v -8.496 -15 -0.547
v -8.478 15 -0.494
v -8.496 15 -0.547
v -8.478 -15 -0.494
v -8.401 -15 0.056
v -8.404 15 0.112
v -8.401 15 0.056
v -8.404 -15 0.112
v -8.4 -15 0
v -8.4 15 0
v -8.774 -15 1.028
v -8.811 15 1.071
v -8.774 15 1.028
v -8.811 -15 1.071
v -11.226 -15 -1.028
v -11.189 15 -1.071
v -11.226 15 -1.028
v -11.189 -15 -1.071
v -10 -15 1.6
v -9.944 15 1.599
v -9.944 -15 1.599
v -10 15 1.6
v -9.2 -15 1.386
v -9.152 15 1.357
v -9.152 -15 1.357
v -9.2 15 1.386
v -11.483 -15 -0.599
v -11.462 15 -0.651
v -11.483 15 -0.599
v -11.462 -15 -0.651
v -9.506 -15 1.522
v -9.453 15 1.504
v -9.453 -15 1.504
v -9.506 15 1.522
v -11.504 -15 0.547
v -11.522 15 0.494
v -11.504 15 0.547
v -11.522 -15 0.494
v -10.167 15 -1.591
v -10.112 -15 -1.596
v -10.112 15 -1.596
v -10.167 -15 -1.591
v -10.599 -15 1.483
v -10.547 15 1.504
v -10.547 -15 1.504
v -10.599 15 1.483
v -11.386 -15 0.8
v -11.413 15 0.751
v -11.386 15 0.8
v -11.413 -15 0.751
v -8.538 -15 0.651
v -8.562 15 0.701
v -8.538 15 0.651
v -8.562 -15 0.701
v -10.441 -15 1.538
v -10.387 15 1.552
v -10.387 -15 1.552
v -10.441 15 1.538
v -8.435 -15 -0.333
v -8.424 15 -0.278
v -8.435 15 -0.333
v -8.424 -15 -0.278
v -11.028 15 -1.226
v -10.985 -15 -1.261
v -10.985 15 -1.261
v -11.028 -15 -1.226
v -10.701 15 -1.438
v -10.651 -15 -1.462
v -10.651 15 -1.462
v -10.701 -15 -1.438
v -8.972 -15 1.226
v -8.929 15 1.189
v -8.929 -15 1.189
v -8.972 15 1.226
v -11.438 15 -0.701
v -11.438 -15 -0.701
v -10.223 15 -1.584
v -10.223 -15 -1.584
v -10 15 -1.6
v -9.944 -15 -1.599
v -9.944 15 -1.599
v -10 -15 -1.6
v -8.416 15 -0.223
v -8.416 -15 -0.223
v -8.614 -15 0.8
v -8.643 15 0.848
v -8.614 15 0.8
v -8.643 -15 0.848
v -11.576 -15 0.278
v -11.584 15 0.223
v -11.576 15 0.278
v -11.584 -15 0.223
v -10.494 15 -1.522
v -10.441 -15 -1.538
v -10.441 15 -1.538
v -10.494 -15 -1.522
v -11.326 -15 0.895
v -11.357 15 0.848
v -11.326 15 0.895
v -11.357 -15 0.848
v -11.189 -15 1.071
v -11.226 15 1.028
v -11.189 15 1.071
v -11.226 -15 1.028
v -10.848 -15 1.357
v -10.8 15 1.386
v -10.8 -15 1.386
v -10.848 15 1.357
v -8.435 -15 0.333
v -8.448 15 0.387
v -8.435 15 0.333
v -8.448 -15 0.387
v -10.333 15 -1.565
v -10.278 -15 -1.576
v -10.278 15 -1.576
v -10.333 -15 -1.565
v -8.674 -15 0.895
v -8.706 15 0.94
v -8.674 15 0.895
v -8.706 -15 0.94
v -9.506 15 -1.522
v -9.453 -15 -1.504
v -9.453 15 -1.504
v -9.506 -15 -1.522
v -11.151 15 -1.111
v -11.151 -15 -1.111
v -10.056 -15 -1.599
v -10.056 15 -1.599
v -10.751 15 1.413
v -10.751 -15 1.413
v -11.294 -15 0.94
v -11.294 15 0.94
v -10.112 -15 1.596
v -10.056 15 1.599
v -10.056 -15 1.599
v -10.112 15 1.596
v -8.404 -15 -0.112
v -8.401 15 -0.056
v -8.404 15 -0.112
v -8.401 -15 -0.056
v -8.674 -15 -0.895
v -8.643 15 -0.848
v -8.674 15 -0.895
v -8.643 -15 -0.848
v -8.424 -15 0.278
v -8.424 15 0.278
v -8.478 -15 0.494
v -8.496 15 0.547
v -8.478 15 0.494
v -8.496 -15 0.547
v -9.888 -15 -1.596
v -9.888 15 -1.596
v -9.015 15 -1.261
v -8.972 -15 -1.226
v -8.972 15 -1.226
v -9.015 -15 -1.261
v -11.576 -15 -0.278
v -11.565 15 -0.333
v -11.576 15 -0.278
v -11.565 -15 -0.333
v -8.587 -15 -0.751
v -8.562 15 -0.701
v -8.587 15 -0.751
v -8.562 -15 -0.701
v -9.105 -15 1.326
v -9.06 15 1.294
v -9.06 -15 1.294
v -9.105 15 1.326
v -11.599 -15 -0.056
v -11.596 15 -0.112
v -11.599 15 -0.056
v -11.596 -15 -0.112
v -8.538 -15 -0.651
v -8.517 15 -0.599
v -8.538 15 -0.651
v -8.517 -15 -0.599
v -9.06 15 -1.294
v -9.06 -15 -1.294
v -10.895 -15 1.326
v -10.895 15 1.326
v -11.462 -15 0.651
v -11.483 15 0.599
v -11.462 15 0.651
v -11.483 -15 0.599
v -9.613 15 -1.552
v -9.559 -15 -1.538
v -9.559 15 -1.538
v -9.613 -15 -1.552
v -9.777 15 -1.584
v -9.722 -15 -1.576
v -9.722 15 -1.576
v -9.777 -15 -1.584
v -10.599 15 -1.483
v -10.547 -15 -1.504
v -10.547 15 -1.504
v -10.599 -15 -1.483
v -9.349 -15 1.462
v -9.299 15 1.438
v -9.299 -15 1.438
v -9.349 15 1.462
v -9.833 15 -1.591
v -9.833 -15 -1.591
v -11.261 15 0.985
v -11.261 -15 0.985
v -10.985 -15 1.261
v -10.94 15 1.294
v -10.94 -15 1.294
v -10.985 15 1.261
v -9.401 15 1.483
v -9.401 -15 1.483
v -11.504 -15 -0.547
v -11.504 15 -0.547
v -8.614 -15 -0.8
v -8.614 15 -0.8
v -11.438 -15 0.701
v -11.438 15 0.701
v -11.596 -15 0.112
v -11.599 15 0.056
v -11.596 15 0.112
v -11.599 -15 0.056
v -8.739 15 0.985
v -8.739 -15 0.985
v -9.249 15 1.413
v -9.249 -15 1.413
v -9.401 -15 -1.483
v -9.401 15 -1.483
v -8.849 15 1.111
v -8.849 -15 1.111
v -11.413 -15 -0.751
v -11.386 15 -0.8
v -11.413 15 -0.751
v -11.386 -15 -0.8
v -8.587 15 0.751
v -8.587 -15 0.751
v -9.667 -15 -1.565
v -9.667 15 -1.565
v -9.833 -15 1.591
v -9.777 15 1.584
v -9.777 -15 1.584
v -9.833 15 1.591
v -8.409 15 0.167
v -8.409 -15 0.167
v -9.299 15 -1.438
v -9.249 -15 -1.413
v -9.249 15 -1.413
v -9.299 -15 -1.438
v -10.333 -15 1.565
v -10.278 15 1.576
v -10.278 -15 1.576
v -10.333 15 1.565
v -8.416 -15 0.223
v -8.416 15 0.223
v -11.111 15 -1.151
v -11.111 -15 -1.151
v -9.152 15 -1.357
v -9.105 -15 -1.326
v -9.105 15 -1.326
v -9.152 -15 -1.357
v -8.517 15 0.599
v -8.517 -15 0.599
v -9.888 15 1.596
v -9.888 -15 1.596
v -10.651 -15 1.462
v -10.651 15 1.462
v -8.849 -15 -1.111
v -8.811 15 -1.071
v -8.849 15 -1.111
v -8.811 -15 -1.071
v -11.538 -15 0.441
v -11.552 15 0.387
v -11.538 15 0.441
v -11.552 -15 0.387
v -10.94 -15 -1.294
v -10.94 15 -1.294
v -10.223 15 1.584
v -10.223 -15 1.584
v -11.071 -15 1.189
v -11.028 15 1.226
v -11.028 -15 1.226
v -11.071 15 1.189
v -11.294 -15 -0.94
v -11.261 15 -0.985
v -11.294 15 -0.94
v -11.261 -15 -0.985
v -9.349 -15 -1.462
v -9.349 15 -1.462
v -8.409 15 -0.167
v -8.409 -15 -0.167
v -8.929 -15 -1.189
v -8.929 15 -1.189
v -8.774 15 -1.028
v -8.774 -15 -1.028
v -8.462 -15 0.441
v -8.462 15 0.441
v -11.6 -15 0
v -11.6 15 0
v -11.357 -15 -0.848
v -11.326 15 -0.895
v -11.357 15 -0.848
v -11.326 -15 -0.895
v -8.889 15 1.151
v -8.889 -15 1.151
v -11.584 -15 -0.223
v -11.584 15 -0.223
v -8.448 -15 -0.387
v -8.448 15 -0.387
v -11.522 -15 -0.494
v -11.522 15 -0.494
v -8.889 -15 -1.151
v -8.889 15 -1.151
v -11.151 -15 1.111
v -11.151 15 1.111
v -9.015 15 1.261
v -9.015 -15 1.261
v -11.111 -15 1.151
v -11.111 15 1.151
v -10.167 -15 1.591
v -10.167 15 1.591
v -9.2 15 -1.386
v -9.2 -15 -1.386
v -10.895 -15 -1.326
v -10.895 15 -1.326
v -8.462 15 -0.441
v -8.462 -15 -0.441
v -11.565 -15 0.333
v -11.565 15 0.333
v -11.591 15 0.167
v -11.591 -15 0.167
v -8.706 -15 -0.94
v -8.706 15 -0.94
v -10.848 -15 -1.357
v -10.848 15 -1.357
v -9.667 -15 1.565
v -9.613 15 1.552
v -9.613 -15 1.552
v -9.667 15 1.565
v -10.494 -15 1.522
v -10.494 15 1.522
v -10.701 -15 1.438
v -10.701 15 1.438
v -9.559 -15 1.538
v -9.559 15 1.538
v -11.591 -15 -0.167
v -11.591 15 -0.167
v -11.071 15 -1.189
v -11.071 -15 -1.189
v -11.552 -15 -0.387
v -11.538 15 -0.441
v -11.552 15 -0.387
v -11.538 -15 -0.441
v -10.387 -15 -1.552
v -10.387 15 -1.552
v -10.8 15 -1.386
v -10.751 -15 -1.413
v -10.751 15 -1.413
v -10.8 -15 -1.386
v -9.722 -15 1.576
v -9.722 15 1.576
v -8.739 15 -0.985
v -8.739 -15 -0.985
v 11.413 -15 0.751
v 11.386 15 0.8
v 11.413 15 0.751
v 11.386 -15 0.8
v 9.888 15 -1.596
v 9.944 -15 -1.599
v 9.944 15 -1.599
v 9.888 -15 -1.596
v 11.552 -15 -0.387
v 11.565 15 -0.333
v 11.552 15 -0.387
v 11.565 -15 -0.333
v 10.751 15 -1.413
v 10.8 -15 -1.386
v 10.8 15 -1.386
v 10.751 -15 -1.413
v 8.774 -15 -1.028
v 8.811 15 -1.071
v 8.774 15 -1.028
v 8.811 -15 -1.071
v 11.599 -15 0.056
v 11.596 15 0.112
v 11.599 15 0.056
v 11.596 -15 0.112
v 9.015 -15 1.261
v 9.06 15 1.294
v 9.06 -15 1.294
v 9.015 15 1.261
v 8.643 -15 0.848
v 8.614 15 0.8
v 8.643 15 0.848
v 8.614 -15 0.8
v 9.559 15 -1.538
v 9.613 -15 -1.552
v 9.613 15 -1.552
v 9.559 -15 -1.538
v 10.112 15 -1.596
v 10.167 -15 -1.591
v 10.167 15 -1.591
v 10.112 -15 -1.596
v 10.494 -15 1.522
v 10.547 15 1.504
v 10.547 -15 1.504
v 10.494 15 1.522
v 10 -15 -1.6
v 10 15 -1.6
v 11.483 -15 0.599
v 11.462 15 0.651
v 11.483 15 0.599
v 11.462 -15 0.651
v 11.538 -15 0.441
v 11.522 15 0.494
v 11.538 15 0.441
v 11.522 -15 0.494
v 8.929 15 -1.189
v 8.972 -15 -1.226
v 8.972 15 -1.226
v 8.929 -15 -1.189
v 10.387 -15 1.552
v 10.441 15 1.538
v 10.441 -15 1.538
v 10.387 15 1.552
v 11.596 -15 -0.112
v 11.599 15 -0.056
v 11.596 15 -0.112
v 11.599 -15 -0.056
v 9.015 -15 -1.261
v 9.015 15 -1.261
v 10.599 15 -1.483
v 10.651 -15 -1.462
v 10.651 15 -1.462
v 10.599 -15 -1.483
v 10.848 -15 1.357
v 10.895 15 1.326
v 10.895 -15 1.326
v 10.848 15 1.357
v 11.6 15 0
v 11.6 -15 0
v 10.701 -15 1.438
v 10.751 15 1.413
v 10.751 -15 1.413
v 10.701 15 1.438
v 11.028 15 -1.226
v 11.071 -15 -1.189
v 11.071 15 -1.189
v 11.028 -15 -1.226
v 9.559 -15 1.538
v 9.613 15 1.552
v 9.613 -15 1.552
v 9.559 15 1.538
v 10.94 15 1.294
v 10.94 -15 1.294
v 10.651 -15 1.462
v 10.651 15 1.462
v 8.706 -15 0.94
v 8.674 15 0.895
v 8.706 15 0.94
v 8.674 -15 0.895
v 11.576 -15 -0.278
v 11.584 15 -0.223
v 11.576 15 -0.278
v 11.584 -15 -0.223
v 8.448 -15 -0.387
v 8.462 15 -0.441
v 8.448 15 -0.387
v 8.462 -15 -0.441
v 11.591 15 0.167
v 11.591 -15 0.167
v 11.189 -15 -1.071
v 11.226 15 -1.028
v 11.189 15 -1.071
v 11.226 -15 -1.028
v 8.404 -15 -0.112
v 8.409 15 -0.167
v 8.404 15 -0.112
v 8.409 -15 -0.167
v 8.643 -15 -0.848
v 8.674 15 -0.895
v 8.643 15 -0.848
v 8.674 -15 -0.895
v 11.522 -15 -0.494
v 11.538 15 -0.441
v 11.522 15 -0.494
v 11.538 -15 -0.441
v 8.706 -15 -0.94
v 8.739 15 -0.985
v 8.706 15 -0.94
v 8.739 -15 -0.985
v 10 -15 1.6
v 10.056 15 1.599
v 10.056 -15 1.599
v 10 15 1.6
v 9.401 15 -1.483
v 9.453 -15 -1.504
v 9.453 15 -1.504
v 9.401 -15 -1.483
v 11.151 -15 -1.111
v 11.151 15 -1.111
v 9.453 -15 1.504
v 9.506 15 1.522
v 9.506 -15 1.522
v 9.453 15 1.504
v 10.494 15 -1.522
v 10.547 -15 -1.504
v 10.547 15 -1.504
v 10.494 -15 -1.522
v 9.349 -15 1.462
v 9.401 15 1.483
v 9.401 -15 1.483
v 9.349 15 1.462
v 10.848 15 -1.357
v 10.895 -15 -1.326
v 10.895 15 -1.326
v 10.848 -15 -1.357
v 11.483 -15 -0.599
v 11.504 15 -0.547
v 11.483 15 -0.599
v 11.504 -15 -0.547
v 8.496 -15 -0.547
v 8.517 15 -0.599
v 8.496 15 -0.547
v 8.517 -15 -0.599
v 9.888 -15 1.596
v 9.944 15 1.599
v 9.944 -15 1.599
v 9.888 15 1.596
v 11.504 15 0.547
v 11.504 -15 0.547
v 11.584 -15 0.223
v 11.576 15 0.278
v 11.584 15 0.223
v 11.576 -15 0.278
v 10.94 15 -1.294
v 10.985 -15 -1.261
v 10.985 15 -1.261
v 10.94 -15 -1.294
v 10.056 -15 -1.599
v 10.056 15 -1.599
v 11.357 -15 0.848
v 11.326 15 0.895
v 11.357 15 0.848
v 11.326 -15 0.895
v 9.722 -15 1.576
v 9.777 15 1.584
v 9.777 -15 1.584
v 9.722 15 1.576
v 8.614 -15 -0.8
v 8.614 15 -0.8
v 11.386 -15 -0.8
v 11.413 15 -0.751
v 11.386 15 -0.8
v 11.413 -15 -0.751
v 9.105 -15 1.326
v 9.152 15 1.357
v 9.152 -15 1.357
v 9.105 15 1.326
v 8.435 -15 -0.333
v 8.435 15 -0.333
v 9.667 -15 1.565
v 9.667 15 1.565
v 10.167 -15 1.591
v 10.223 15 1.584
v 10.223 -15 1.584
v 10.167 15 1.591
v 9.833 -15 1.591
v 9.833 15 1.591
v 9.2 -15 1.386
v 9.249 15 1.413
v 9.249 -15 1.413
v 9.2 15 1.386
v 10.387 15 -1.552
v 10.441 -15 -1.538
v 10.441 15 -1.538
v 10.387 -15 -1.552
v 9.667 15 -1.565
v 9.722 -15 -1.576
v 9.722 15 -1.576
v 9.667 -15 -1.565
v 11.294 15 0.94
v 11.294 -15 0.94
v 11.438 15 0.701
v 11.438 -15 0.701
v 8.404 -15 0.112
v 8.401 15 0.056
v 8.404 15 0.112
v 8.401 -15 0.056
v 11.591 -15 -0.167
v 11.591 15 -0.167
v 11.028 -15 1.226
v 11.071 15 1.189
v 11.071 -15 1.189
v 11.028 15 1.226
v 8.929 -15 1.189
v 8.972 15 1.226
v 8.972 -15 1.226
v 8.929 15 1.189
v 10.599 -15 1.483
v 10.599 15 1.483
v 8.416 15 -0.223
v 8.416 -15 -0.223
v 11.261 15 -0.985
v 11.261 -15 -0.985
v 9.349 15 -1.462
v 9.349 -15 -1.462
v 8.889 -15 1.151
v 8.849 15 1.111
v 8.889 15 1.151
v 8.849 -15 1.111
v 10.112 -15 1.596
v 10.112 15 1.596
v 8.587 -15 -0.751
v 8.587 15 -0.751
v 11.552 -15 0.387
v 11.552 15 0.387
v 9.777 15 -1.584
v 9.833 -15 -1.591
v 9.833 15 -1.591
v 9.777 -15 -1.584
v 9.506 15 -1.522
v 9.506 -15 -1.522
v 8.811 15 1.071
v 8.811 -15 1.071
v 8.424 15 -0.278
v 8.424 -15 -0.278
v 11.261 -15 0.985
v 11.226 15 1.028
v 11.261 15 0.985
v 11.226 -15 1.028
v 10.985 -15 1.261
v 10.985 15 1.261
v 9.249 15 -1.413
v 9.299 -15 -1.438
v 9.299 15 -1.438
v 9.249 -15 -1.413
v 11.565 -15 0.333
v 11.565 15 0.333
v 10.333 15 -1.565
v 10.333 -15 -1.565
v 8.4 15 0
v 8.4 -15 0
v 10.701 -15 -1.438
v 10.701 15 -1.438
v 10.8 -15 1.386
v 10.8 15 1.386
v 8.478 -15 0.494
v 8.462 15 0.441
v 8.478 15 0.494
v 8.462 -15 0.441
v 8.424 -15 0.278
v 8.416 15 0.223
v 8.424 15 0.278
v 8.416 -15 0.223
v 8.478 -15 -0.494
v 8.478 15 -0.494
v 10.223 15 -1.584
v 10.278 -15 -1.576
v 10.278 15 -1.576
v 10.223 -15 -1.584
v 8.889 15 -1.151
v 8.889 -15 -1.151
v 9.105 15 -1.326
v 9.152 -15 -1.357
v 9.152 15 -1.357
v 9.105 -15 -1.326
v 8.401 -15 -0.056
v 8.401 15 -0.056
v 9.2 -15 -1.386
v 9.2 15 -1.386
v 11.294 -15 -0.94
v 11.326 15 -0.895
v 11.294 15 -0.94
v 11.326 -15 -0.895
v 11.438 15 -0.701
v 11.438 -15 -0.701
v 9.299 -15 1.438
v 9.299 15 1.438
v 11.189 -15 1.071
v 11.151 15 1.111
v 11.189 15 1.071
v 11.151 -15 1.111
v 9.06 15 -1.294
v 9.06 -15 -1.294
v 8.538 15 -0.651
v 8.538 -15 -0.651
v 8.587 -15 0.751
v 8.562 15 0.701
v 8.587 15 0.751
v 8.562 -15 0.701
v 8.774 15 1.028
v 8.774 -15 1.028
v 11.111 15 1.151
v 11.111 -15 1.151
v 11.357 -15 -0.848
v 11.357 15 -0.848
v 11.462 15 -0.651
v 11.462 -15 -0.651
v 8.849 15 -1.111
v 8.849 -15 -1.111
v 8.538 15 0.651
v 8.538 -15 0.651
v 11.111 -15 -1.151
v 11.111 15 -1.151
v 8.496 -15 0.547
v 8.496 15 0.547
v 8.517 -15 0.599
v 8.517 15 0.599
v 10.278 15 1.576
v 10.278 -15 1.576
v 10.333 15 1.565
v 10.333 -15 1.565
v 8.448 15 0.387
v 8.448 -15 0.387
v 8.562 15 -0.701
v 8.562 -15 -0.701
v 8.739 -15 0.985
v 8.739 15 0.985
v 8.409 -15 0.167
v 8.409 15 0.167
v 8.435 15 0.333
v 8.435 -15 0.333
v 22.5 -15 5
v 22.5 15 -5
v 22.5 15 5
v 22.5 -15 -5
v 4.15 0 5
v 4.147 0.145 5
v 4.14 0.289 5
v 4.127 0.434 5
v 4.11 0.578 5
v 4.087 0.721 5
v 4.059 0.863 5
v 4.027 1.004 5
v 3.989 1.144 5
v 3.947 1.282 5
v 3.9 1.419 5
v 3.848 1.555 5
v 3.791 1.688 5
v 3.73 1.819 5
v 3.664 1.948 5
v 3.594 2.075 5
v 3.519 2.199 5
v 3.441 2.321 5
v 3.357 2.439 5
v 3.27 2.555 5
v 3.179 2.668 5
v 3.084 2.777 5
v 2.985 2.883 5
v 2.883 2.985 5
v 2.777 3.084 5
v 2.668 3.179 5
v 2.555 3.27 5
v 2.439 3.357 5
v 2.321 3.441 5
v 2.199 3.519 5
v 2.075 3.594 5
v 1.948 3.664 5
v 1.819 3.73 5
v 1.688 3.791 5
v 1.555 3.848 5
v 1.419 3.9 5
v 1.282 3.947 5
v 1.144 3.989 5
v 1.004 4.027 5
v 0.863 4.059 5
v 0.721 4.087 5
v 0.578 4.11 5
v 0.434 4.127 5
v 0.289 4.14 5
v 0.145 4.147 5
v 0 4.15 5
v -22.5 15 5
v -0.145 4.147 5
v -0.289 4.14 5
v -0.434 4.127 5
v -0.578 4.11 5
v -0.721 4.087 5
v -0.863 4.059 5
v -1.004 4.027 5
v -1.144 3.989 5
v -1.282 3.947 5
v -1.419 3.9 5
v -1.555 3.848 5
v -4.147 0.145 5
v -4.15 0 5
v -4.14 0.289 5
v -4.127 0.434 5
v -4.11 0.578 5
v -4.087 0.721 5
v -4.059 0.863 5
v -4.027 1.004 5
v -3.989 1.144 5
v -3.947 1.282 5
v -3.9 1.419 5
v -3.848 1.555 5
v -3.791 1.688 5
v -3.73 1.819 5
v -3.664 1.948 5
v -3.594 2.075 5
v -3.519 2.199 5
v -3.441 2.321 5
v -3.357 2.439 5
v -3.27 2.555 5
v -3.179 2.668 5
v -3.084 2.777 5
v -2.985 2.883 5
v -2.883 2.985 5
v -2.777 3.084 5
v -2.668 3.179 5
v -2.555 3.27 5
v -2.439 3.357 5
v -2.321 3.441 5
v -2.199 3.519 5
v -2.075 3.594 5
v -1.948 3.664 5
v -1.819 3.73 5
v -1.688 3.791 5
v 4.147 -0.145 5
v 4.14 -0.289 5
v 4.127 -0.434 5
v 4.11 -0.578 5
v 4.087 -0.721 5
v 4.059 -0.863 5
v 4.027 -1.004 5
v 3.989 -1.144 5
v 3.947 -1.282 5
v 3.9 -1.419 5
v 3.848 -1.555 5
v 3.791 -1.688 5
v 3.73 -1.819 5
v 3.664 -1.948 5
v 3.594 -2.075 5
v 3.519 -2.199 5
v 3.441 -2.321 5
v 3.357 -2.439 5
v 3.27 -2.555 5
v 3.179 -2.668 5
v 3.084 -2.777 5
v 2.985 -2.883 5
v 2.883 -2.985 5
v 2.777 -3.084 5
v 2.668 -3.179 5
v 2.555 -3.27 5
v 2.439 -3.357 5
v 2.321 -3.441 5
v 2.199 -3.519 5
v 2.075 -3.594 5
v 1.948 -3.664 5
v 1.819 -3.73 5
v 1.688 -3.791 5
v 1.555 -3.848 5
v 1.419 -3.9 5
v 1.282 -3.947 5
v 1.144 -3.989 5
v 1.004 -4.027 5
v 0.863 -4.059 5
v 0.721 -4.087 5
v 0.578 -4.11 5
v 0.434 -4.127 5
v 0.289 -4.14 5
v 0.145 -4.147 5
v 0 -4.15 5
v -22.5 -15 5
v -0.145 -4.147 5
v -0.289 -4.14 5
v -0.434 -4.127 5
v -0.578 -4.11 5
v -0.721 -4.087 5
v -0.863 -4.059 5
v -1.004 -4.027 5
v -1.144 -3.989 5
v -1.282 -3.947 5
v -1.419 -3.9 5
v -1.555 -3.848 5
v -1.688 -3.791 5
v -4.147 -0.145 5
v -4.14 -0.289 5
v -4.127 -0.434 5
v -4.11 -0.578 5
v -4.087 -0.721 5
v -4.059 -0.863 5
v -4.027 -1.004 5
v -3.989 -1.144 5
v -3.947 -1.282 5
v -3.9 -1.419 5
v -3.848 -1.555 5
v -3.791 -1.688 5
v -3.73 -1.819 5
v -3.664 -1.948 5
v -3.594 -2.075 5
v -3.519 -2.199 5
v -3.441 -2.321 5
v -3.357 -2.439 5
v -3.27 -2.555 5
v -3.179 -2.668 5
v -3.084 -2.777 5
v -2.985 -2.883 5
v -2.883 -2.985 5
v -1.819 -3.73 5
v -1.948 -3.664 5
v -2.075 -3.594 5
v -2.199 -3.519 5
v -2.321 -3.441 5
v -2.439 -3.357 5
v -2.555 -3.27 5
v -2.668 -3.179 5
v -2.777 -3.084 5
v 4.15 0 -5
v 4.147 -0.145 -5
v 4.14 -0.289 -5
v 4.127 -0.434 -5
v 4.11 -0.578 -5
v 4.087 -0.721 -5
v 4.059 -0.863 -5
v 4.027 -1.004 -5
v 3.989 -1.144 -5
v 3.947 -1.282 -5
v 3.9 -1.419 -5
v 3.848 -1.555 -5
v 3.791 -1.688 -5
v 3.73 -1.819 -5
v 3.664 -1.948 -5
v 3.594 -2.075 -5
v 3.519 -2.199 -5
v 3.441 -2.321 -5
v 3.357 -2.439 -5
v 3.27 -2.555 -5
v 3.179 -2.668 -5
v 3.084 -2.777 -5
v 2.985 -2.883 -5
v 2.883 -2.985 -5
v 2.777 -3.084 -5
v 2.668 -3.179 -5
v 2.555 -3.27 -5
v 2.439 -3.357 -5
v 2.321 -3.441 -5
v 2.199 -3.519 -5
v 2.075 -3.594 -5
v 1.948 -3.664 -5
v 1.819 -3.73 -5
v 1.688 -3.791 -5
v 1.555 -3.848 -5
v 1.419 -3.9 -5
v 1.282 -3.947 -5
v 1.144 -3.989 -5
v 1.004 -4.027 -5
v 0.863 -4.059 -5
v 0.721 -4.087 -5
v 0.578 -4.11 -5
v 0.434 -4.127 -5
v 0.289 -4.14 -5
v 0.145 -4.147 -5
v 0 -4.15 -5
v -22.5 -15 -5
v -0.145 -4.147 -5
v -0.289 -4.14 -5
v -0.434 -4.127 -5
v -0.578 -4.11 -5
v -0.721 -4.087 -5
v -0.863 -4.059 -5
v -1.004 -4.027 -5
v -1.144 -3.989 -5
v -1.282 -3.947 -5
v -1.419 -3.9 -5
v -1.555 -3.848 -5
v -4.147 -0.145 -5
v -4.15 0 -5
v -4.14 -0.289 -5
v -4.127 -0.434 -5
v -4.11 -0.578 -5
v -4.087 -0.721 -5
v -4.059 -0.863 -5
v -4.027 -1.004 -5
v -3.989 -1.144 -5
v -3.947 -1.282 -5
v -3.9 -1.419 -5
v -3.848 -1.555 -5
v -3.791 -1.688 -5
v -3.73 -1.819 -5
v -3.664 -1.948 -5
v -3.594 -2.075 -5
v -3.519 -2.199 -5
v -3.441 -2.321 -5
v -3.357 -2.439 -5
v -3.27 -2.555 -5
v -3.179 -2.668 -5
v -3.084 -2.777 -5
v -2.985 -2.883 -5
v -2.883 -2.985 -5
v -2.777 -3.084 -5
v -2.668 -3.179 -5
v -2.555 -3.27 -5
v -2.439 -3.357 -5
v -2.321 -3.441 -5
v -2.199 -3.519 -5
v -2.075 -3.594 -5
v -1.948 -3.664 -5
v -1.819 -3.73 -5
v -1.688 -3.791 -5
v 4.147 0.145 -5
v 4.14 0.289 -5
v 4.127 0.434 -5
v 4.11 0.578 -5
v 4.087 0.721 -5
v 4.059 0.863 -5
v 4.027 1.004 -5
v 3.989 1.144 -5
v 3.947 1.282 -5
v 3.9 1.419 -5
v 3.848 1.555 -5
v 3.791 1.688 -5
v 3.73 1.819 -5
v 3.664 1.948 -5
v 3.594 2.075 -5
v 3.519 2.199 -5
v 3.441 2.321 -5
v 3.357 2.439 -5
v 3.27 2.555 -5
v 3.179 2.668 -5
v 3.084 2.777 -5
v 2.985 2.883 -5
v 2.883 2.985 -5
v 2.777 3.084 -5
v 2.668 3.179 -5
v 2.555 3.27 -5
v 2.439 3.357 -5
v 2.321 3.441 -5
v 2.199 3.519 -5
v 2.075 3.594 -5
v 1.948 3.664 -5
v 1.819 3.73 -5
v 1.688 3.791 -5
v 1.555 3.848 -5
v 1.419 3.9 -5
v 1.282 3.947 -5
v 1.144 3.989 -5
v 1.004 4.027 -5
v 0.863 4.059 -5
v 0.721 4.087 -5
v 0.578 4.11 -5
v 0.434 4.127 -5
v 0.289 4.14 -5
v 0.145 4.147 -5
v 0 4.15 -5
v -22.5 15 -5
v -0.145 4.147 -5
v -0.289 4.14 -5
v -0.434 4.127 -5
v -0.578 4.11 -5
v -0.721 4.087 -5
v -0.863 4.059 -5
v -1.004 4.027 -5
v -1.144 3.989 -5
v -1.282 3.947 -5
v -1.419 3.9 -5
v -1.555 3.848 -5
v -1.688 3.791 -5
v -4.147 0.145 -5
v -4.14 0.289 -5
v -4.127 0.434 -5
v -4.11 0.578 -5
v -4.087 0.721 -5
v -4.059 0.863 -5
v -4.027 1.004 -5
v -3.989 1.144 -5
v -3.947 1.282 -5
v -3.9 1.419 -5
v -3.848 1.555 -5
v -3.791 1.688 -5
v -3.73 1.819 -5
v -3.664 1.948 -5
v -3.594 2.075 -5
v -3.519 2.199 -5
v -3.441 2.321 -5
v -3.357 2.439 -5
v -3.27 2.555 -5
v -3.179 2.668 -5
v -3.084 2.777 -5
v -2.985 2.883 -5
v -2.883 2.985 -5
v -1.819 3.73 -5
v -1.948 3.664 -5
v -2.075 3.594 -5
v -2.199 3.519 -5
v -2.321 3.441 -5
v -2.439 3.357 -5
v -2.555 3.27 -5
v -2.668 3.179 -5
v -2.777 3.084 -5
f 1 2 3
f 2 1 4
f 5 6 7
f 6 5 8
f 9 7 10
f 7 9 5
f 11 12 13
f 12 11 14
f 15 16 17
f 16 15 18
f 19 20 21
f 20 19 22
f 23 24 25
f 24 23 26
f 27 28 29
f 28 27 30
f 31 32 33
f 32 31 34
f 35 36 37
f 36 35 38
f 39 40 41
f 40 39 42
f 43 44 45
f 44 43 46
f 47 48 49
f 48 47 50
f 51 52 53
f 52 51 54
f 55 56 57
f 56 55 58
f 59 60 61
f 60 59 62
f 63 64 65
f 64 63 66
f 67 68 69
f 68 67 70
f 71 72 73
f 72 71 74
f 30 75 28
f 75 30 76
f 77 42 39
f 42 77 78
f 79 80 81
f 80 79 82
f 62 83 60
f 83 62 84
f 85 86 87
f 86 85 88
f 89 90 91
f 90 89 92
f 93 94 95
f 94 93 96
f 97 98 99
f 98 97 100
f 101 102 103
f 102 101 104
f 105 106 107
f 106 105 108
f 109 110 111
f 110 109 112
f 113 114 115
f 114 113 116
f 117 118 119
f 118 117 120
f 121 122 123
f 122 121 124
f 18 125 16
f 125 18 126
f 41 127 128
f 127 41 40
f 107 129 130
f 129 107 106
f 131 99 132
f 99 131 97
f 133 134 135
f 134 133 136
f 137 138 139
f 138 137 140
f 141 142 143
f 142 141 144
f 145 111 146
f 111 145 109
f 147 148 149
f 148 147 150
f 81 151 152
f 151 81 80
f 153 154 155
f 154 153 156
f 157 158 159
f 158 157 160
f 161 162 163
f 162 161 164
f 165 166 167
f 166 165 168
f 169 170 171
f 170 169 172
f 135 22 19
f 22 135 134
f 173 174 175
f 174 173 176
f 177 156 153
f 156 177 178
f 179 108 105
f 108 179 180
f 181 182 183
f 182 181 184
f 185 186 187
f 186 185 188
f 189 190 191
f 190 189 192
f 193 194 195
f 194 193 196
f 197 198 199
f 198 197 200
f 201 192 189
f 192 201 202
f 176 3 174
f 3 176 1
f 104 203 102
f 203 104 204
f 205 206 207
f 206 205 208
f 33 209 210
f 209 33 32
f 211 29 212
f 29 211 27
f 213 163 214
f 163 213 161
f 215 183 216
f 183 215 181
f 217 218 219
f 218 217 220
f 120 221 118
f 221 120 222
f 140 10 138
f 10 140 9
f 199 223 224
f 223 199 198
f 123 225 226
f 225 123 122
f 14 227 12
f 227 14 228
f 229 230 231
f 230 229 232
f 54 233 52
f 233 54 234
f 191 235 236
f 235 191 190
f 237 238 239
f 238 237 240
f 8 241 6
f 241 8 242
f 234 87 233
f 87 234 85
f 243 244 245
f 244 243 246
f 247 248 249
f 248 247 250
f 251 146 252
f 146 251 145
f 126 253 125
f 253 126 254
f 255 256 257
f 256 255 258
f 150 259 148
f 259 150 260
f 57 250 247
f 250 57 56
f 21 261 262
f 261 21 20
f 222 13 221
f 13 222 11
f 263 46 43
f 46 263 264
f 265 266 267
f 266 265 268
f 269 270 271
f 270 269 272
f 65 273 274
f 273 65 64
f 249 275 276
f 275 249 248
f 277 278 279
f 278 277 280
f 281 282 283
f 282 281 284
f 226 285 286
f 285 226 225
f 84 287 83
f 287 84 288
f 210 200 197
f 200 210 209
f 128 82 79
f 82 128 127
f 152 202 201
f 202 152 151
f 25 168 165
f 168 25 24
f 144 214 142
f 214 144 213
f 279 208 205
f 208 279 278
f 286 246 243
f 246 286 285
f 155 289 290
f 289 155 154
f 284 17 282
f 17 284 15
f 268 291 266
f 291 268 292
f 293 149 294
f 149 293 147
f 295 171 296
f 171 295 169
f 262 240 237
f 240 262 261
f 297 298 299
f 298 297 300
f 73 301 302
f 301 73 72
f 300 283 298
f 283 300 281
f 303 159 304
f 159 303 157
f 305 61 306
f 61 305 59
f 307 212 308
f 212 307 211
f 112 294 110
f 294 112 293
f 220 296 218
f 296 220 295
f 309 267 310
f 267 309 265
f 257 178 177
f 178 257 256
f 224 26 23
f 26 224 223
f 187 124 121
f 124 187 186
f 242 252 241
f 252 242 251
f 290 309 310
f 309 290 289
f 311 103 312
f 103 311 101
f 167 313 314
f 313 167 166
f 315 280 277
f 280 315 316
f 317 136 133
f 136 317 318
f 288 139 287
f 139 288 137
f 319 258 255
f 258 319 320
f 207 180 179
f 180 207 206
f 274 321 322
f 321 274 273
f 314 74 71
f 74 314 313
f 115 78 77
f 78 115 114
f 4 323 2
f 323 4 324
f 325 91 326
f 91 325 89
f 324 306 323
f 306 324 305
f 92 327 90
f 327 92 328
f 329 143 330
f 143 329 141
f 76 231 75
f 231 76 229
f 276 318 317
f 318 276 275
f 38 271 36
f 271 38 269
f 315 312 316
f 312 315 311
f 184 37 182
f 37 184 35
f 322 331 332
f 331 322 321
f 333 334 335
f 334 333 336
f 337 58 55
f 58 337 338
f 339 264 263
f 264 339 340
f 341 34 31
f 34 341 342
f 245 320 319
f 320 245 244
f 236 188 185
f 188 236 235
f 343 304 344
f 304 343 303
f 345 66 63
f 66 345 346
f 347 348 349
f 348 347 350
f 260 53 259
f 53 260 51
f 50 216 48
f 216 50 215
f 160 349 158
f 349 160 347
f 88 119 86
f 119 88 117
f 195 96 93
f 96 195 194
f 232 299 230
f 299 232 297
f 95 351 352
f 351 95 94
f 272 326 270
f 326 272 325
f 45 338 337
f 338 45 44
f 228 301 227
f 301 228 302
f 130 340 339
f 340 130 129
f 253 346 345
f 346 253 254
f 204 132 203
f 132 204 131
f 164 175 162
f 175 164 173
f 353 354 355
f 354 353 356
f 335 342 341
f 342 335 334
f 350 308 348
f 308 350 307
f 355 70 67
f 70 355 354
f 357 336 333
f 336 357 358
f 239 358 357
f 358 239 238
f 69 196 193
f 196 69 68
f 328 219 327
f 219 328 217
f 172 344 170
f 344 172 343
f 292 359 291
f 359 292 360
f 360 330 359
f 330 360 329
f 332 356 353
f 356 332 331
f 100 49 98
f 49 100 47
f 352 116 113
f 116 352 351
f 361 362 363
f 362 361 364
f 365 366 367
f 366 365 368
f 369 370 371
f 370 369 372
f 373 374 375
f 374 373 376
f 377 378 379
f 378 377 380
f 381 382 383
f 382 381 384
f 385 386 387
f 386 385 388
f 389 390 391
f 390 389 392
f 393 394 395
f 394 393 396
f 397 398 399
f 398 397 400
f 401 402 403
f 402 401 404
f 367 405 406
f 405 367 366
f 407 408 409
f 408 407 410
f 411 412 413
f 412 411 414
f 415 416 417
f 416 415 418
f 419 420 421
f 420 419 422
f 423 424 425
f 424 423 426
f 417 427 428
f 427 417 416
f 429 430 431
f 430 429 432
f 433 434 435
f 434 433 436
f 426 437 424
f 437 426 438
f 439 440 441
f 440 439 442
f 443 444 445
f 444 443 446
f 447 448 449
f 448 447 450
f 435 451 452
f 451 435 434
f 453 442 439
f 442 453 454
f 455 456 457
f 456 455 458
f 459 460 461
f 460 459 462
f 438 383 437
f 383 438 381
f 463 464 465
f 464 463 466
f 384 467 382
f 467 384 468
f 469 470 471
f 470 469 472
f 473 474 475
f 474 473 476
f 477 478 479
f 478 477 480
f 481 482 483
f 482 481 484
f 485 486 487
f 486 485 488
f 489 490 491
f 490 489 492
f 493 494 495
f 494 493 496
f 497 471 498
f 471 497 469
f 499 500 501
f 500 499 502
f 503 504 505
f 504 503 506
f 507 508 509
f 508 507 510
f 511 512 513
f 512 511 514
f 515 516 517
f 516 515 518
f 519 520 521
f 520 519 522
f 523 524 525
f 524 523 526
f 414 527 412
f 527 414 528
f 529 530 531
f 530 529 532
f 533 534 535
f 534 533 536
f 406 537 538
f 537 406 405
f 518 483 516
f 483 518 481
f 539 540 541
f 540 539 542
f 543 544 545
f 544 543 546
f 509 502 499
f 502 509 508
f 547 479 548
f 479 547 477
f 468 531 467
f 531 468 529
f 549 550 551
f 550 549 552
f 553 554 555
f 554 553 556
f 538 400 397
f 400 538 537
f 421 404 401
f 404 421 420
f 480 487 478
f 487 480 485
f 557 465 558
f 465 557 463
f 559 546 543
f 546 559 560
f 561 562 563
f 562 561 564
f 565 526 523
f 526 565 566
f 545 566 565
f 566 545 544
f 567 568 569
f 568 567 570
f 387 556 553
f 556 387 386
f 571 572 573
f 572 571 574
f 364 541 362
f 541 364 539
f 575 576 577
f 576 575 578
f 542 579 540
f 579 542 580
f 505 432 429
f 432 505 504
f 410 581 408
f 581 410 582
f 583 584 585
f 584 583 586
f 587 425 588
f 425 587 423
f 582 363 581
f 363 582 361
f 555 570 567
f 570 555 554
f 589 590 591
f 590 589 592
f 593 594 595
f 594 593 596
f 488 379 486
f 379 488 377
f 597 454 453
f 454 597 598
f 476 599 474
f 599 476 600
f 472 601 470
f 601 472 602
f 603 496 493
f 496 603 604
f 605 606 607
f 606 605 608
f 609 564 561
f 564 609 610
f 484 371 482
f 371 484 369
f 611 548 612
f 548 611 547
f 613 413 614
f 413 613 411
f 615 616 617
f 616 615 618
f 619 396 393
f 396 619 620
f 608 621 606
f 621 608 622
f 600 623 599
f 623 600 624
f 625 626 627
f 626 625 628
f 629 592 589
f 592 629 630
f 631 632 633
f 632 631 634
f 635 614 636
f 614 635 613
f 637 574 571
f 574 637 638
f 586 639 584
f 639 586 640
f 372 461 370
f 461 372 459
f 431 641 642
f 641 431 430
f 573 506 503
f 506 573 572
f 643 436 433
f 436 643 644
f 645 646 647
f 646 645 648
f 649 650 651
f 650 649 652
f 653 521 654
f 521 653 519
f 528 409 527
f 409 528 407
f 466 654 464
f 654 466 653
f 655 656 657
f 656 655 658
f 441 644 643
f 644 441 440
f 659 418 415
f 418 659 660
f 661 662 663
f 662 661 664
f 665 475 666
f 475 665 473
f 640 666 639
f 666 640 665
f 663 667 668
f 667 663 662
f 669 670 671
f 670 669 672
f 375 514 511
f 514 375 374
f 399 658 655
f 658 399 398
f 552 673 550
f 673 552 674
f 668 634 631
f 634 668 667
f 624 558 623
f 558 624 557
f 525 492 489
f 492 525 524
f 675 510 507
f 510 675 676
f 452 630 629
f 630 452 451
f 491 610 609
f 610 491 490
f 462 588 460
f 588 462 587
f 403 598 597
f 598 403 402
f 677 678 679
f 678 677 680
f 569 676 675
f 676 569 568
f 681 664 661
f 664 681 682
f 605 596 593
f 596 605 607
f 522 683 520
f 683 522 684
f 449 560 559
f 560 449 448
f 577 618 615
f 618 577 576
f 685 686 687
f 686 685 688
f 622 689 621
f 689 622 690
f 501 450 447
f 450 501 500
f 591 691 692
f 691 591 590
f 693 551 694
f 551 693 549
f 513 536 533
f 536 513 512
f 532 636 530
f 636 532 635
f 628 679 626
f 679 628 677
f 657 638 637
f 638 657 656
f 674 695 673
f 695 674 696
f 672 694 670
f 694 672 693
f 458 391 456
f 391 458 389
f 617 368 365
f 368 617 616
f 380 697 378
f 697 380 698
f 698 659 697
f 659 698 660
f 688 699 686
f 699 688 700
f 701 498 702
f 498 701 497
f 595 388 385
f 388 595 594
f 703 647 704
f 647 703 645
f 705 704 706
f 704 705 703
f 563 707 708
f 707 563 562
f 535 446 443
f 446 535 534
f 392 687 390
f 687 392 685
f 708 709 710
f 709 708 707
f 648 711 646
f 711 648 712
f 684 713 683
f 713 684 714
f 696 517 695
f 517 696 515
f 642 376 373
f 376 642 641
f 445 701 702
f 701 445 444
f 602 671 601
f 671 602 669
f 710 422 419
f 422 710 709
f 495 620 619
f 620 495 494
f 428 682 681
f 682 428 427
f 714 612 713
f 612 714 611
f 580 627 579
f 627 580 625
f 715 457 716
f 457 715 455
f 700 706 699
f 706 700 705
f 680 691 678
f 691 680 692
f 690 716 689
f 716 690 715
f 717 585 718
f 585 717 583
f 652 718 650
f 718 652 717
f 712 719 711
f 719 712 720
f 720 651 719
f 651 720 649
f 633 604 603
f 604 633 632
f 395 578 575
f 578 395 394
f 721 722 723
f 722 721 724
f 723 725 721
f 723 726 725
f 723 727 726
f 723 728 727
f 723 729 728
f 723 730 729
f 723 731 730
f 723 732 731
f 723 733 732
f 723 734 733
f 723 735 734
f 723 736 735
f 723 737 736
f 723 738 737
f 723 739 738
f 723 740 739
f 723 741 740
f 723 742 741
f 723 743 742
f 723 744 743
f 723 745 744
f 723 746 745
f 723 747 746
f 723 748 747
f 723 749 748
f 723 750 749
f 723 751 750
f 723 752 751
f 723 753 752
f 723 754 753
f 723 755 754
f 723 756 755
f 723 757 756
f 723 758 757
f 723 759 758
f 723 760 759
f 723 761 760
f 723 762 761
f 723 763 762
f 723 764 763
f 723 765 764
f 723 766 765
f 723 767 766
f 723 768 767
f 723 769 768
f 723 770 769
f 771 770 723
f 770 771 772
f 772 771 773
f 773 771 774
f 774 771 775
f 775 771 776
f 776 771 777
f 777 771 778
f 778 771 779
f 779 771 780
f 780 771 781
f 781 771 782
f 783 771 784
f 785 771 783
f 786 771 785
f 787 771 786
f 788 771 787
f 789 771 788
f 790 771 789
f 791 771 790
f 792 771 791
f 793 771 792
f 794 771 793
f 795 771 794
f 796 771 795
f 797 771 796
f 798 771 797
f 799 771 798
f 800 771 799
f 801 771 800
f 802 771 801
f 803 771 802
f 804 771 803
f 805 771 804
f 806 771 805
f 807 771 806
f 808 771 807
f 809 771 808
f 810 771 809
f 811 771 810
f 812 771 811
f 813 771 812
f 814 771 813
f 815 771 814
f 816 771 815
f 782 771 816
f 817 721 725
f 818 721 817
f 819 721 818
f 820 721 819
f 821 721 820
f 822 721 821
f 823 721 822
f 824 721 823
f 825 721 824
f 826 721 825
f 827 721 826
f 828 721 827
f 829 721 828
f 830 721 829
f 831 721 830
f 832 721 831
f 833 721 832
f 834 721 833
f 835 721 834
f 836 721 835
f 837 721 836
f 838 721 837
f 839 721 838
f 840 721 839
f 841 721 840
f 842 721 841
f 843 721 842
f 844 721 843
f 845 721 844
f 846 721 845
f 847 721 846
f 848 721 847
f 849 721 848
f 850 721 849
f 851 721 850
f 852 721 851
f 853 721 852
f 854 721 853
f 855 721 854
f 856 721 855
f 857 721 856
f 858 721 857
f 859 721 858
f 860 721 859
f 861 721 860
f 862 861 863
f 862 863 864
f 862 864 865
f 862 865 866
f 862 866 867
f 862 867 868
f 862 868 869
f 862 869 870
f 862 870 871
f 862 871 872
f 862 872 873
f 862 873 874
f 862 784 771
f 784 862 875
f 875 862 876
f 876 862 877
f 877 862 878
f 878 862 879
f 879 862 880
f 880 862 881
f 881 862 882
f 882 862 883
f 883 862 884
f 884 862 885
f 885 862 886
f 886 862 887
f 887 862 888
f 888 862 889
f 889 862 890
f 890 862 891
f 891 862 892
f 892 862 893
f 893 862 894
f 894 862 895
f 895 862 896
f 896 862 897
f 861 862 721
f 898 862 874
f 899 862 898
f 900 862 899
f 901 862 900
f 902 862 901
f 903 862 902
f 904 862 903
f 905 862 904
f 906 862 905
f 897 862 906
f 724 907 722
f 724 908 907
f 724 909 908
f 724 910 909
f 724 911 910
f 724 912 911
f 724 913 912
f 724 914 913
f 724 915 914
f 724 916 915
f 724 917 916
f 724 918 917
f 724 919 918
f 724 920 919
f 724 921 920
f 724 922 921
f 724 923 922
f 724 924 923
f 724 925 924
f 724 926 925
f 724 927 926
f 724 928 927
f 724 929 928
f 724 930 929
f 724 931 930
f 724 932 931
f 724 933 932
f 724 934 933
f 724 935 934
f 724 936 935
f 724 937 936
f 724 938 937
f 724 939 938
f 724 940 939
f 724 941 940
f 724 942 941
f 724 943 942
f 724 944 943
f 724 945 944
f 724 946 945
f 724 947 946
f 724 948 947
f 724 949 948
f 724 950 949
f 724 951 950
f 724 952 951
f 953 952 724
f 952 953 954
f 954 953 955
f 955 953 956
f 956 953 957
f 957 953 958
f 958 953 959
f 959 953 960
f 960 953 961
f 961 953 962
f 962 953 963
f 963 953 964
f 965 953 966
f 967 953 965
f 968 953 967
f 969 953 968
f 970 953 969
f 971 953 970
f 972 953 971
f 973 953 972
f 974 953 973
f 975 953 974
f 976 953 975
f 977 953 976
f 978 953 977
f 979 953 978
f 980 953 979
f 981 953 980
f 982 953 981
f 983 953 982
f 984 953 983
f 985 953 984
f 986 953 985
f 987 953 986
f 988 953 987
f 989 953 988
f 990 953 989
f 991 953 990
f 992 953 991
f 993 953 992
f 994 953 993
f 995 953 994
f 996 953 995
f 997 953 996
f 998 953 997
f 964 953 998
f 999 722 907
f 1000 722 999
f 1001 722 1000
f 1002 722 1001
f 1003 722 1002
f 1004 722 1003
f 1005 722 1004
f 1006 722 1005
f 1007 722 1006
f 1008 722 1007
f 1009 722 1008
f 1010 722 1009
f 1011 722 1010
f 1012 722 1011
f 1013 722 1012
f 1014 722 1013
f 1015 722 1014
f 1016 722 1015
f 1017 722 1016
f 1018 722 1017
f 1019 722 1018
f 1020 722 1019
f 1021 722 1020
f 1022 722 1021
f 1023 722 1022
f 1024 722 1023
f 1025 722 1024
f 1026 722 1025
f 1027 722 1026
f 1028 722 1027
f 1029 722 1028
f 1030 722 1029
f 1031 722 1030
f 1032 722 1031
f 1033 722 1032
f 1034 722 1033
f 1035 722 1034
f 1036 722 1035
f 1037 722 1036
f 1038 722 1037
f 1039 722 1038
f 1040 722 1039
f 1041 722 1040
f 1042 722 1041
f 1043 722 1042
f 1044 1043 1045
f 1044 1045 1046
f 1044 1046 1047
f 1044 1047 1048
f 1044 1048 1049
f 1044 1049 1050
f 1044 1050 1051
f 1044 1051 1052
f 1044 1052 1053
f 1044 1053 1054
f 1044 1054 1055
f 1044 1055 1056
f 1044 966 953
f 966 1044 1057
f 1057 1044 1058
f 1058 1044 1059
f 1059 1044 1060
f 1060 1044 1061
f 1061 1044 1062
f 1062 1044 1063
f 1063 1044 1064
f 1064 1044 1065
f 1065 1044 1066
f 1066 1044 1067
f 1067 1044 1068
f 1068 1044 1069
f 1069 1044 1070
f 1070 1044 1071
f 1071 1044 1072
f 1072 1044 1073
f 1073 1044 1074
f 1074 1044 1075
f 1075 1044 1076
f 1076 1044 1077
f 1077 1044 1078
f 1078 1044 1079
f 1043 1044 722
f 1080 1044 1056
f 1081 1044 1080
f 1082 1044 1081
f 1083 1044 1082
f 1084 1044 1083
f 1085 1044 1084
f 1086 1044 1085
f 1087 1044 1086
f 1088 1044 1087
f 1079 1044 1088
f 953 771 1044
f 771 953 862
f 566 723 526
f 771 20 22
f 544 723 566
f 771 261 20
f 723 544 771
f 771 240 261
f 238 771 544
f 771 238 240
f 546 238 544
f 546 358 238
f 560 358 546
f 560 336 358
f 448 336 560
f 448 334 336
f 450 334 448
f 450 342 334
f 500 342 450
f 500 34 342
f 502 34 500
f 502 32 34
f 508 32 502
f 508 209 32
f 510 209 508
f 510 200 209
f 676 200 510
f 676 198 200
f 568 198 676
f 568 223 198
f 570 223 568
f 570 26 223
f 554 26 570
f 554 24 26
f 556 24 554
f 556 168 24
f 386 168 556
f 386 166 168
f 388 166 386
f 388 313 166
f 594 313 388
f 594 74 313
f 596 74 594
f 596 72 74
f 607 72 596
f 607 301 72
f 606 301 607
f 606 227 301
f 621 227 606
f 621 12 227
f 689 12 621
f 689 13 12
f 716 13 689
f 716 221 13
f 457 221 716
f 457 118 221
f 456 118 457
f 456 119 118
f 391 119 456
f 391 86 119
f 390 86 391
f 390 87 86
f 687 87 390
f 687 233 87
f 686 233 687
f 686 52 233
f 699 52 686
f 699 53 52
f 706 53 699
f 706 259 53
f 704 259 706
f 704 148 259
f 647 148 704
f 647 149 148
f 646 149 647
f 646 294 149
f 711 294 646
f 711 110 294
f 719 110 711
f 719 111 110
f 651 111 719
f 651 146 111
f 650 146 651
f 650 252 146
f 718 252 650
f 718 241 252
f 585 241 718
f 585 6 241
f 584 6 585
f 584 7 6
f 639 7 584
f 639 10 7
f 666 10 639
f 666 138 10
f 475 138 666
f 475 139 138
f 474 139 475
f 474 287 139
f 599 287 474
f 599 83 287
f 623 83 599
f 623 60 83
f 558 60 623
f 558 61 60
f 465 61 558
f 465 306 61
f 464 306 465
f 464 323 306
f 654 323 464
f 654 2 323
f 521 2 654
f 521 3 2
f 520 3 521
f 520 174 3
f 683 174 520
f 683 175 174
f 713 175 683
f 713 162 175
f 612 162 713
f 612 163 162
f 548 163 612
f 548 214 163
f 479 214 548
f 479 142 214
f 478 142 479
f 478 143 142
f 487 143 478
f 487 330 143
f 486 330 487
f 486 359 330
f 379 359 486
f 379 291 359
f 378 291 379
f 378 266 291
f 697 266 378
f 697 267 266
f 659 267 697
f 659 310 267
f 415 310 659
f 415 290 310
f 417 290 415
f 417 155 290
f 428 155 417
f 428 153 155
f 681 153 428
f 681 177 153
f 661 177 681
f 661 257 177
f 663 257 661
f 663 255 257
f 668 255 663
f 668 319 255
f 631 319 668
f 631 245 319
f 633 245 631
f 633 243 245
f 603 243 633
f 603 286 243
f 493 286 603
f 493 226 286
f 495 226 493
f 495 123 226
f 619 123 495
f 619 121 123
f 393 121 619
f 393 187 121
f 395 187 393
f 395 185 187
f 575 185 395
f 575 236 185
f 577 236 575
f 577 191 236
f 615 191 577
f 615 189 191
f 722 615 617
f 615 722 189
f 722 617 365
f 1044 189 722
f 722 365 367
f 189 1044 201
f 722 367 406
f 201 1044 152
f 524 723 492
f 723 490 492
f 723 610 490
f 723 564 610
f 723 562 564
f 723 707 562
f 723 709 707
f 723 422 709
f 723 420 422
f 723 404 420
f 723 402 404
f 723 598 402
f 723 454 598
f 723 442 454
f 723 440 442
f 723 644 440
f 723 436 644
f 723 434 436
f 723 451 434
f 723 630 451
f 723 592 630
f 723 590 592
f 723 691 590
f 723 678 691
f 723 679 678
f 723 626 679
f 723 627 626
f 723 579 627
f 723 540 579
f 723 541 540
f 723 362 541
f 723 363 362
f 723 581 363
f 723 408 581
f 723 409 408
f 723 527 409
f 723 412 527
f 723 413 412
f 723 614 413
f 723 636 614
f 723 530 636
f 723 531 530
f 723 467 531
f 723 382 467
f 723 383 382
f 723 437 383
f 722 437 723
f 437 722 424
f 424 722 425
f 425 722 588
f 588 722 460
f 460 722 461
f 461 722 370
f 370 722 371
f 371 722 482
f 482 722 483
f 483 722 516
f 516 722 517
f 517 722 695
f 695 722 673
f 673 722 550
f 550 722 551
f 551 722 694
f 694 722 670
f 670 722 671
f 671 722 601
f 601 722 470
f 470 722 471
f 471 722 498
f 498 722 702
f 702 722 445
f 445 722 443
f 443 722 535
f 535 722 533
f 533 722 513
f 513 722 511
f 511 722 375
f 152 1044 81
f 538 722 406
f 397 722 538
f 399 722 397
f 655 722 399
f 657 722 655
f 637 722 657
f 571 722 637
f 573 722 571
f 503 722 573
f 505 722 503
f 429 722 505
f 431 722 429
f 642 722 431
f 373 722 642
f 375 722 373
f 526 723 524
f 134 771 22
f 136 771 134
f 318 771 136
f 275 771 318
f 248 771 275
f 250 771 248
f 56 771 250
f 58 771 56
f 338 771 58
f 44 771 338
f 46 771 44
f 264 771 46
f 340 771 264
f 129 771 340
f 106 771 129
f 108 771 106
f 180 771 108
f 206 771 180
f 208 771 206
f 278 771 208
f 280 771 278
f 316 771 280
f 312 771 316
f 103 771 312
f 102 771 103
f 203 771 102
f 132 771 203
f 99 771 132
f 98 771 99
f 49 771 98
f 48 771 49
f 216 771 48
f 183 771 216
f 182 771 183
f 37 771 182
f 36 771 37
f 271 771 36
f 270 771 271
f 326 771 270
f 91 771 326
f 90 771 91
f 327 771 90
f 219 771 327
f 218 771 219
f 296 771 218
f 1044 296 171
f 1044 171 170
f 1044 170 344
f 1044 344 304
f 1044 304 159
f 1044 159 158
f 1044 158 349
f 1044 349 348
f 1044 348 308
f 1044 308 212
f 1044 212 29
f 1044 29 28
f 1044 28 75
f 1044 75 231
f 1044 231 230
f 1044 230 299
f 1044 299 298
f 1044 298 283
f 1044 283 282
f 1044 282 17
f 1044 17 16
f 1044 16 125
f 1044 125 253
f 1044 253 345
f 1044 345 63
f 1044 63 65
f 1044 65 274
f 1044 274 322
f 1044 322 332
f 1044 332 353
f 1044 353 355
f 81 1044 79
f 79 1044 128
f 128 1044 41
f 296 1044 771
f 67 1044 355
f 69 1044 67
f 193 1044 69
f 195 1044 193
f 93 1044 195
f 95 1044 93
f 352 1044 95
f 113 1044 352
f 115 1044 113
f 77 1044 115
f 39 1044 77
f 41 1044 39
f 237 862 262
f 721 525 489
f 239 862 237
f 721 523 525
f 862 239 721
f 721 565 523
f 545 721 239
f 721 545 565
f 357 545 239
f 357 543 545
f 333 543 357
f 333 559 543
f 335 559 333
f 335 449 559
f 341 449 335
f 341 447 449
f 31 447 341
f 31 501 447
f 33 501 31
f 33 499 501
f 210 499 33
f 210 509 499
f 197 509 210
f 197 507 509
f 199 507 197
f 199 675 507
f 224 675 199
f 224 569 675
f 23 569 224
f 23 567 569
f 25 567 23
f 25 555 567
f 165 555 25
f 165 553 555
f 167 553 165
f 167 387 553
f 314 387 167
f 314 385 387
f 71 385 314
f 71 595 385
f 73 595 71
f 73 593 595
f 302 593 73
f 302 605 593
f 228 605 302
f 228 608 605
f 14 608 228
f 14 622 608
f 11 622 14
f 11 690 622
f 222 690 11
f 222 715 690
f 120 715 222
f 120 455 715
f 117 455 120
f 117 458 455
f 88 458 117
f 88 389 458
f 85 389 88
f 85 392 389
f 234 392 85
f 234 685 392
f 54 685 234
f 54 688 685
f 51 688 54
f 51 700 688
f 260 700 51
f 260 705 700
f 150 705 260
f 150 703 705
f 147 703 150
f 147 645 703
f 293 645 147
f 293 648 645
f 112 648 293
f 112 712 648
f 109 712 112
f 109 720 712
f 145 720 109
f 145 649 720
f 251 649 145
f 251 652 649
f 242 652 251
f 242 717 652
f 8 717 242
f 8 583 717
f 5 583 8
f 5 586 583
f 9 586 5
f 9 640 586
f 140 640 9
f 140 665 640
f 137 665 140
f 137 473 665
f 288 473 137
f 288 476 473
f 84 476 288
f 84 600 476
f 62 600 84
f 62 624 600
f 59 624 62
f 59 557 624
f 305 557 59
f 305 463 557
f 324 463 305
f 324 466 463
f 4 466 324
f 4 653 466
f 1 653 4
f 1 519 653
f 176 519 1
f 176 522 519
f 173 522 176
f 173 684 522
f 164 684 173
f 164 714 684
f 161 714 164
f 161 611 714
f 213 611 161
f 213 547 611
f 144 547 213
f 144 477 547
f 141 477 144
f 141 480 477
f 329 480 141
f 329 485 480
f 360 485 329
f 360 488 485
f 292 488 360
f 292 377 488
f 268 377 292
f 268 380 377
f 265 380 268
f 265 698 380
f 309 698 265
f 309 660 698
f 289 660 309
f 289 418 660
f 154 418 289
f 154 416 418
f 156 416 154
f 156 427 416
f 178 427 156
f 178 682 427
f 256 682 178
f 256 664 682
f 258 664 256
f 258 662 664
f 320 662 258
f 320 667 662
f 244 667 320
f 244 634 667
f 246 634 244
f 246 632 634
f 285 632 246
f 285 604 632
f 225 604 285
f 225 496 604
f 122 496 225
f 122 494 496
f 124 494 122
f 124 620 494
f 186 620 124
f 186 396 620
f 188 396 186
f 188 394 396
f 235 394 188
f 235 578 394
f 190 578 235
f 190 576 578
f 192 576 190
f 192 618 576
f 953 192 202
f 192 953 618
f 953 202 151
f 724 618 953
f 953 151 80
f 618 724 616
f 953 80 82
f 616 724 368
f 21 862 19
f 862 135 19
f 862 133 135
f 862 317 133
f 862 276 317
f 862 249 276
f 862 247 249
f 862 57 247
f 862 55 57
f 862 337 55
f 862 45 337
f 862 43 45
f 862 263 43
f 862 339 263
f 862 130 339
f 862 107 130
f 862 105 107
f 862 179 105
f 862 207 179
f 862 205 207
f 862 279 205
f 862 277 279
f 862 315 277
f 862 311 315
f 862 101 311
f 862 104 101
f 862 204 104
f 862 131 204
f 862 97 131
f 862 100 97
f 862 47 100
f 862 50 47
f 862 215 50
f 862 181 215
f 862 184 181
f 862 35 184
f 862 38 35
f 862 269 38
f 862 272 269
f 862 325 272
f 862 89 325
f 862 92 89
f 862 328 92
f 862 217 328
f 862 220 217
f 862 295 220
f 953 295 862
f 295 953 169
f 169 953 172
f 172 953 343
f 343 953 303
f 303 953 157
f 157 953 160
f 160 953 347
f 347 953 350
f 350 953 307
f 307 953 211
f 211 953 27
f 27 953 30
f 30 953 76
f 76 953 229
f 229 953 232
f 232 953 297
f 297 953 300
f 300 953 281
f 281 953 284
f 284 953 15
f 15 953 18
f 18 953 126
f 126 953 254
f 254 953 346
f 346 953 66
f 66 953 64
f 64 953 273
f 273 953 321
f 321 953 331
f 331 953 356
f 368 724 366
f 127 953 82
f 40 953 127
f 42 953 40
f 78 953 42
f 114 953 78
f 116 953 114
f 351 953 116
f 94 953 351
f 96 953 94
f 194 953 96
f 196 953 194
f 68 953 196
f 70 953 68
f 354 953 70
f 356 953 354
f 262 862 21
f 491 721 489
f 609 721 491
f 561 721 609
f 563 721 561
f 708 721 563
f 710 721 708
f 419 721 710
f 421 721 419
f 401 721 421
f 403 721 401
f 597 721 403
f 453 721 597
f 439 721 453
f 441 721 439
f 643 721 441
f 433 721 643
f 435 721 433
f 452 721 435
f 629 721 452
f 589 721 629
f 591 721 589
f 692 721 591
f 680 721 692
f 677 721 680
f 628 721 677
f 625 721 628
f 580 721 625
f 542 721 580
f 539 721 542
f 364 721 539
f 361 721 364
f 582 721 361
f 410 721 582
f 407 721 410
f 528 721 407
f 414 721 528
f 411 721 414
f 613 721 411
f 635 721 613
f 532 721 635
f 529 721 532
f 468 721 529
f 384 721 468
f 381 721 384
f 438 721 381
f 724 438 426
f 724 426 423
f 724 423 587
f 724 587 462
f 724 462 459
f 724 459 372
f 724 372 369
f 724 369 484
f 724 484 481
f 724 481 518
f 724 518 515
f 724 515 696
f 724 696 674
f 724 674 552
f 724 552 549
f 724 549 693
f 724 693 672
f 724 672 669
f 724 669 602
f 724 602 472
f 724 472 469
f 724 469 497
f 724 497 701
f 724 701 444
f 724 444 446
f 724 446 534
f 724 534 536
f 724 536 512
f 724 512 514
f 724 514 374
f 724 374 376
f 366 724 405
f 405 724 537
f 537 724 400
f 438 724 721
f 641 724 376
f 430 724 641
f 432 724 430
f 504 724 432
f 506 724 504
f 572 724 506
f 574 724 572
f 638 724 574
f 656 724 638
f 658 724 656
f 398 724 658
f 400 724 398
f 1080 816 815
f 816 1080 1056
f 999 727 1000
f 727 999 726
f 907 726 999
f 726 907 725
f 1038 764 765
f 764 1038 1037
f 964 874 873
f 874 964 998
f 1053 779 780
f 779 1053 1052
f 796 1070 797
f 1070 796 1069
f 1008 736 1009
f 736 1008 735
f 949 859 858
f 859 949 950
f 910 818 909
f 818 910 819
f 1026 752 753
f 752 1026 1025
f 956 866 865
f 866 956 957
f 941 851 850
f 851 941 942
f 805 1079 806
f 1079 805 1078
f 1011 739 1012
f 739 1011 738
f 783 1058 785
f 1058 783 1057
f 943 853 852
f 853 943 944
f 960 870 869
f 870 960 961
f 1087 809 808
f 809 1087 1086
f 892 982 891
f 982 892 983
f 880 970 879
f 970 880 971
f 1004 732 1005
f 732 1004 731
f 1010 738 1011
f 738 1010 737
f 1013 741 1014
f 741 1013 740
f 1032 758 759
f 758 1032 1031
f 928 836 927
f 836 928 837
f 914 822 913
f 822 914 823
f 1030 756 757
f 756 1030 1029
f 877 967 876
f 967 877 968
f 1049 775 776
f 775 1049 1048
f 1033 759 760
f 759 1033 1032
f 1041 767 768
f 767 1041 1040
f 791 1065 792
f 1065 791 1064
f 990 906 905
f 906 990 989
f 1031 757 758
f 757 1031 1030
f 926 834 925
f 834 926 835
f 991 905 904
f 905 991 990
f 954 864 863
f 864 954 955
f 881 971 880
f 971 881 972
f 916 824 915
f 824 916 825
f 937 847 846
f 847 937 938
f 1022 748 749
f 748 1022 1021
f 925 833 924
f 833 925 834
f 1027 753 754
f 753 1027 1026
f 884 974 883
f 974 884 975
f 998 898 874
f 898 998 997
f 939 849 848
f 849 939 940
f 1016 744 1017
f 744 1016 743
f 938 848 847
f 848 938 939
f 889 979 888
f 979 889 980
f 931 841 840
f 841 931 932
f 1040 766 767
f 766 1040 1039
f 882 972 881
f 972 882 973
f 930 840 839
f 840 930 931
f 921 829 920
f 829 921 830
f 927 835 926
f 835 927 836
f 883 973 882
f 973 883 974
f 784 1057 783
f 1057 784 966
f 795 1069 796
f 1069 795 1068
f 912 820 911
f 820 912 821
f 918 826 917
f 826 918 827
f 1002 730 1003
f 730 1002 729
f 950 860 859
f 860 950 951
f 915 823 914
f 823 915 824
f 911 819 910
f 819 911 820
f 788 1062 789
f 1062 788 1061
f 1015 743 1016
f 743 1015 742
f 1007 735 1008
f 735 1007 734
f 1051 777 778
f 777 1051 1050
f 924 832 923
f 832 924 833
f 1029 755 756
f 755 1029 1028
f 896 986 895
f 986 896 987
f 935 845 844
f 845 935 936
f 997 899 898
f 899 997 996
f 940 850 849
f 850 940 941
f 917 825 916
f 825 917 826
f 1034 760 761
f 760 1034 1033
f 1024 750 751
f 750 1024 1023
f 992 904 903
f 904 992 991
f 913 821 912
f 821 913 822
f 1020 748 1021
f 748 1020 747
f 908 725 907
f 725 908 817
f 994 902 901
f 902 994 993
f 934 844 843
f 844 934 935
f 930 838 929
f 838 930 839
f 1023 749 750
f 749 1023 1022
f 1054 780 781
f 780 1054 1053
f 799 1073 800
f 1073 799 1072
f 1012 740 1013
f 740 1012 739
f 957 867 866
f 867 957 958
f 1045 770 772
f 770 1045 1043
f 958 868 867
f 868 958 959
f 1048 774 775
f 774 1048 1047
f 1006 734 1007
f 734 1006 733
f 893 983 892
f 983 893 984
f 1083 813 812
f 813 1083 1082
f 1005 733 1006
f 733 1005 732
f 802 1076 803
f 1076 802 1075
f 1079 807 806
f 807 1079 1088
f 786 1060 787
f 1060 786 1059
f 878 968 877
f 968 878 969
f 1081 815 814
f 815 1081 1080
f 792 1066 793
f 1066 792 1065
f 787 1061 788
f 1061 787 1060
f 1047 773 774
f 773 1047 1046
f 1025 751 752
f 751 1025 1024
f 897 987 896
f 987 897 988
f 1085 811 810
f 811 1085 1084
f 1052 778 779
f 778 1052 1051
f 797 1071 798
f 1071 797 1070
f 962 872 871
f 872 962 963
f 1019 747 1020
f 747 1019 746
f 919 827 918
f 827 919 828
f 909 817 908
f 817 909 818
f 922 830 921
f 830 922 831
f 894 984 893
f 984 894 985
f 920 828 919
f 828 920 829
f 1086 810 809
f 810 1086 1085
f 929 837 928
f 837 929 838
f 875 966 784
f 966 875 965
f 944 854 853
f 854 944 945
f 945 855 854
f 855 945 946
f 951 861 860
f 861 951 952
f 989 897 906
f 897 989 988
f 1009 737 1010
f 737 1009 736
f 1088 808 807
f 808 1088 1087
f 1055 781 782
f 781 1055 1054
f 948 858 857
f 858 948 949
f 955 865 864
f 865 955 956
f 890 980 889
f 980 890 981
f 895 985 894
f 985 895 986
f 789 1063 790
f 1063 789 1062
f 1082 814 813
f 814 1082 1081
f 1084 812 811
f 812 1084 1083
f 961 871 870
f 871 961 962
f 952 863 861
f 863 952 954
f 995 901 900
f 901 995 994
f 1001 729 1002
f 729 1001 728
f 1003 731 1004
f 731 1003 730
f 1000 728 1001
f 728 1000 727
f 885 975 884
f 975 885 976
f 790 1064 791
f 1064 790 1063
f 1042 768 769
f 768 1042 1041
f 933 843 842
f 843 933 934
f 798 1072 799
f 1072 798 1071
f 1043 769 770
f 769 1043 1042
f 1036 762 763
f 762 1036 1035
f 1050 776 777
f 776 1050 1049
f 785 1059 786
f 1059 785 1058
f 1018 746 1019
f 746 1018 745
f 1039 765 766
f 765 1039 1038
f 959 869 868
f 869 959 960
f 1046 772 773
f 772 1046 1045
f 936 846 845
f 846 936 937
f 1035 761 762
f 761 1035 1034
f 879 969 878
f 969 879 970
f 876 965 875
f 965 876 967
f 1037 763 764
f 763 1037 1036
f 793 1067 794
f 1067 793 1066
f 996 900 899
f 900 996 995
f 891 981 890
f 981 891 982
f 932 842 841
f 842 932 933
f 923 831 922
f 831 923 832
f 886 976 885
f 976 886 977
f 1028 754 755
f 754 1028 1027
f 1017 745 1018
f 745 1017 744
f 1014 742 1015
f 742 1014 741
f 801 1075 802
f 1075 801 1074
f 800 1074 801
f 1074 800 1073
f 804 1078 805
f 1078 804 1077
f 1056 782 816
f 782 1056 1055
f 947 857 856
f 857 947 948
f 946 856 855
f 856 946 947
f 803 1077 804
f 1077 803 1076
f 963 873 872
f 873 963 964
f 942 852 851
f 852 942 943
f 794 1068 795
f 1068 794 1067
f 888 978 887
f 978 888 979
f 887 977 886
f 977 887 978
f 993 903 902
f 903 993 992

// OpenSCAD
//cube([120,120,3], center = true);
//translate([-45,-45,0])cylinder(h = 3, r=15, $fn = 180, center = true);
//rotate_extrude(convexity = 10, $fn = A) translate([20+1.5, 0, 0])circle(d = 3, $fn = B);






difference(){
cube([45,30,10], center = true);

cylinder(h = 21, d=8.3, $fn = 180, center = true);
    
for(i=[-1,1]) translate([i*10,0,0]) rotate([90,0,0]) cylinder(h = 50, d=3.2, $fn = 180, center = true);

}







 
